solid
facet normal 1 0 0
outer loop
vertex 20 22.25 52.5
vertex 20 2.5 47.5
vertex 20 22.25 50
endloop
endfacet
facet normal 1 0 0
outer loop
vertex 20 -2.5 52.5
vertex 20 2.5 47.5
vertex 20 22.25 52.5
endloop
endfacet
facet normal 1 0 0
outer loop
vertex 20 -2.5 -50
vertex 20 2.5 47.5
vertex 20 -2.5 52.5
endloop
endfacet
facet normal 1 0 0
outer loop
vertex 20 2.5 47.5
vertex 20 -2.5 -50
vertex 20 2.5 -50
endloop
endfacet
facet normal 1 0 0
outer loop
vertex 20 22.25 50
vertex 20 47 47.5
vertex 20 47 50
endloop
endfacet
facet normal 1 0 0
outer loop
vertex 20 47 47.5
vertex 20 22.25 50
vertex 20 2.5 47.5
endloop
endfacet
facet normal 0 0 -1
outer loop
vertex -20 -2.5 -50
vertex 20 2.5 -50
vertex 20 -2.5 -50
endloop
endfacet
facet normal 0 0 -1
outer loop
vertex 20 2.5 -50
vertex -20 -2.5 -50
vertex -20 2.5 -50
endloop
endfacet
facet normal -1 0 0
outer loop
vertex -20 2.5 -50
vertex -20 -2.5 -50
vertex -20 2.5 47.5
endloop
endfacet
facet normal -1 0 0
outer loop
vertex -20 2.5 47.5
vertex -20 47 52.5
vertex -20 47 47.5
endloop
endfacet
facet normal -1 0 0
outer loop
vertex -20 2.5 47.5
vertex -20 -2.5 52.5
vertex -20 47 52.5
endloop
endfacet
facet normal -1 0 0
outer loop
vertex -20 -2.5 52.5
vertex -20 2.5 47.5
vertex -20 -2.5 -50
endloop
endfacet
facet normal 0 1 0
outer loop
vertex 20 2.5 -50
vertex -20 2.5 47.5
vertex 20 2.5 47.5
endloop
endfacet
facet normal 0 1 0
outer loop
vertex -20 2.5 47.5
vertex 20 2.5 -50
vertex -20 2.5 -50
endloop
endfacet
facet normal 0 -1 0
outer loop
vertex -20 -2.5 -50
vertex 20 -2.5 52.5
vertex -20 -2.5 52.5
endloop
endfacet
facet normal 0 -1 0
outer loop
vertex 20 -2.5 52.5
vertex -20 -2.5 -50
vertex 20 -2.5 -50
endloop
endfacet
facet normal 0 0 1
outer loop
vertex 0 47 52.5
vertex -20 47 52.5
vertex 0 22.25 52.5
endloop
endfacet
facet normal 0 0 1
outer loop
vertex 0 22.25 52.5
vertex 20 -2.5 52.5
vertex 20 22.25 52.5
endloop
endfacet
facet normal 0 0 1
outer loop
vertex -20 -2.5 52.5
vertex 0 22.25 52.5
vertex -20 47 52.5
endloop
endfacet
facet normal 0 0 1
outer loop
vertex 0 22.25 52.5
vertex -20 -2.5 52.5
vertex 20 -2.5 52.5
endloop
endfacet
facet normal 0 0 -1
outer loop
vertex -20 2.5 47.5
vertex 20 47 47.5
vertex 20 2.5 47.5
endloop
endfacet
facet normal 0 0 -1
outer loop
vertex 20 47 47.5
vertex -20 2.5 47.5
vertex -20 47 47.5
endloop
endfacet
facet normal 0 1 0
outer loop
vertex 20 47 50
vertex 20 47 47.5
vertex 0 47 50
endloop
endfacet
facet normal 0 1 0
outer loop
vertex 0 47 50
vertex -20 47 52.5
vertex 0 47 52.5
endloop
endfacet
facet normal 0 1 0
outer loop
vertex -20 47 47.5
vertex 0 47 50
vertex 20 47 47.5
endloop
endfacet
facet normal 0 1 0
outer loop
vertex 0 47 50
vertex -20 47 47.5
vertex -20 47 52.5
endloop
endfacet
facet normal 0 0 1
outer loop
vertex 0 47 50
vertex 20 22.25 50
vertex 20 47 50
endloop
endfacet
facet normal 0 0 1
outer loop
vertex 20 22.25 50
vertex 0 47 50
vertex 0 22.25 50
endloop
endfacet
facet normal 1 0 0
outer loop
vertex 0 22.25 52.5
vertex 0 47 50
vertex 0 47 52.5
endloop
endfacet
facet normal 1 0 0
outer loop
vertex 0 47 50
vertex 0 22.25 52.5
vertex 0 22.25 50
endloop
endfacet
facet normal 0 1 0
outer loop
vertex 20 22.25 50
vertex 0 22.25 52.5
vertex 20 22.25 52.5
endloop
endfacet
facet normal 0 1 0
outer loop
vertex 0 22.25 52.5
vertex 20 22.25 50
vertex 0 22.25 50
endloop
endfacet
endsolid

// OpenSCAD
width = 220;
depth = 220;
height = 5;

// razor stand
rz_stand_width = 5;
rz_stand_depth = 5;
rz_stand_height = 100;
rz_cross_bar_width = 30;
rz_cross_bar_depth = 5;
rz_cross_bar_height = 5;
rz_arm_width = 5;
rz_arm_depth = 30;
rz_arm_height = 5;
rz_arm_notch_width = 5;
rz_arm_notch_depth = 20;
rz_arm_notch_height = rz_arm_height/2;

brush_stand_base_width = 40;
brush_stand_base_depth = 5;
brush_stand_base_height = 100;
brush_stand_width = 40;
brush_stand_depth = 33*1.5;
brush_stand_height = 5;

module base()
{
  difference()
  {
    union() 
    {
      cube([ width, depth, height ], center = true );
    }
  }
}

module razor_stand()
{
  difference()
  {
    union ()
    {
      cube([ rz_stand_width, rz_stand_depth, rz_stand_height ], center= true );
      translate([ 0, 0, rz_stand_height/2 ])
        cube([ rz_cross_bar_width, rz_cross_bar_depth, rz_cross_bar_height ], center= true );
      translate([ rz_cross_bar_width/2, rz_arm_depth/2-rz_cross_bar_depth/2, rz_stand_height/2 ])
      {
        cube([ rz_arm_width, rz_arm_depth, rz_arm_height ], center= true );
        translate([ -rz_cross_bar_width, 0, 0 ])
          cube([ rz_arm_width, rz_arm_depth, rz_arm_height ], center= true );
      }
    }  
    translate([ rz_cross_bar_width/2-rz_arm_notch_width/2, rz_cross_bar_height, rz_stand_height/2 ])
      cube([ rz_arm_notch_width, rz_arm_notch_depth, rz_arm_notch_height ]);

mirror([ 1, 0, 0 ])
    translate([ rz_cross_bar_width/2-rz_arm_notch_width/2, rz_cross_bar_height, rz_stand_height/2 ])
      cube([ rz_arm_notch_width, rz_arm_notch_depth, rz_arm_notch_height ]);
  
  }
}
      
 module brush_stand()
{
  difference()
  {
    union()
    {
      cube([ brush_stand_base_width, brush_stand_base_depth, brush_stand_base_height ], center=true );
      translate([ 0, brush_stand_depth/2-height/2, brush_stand_base_height/2 ])
      cube([ brush_stand_width, brush_stand_depth, brush_stand_height ], center=true );
      }

      translate([ 0, brush_stand_depth/2-height/2, brush_stand_base_height/2 ])      
      cube([ brush_stand_width-brush_stand_height/2, brush_stand_depth*.75, brush_stand_height ]);
  }
}
//base();
//razor_stand();
brush_stand();
